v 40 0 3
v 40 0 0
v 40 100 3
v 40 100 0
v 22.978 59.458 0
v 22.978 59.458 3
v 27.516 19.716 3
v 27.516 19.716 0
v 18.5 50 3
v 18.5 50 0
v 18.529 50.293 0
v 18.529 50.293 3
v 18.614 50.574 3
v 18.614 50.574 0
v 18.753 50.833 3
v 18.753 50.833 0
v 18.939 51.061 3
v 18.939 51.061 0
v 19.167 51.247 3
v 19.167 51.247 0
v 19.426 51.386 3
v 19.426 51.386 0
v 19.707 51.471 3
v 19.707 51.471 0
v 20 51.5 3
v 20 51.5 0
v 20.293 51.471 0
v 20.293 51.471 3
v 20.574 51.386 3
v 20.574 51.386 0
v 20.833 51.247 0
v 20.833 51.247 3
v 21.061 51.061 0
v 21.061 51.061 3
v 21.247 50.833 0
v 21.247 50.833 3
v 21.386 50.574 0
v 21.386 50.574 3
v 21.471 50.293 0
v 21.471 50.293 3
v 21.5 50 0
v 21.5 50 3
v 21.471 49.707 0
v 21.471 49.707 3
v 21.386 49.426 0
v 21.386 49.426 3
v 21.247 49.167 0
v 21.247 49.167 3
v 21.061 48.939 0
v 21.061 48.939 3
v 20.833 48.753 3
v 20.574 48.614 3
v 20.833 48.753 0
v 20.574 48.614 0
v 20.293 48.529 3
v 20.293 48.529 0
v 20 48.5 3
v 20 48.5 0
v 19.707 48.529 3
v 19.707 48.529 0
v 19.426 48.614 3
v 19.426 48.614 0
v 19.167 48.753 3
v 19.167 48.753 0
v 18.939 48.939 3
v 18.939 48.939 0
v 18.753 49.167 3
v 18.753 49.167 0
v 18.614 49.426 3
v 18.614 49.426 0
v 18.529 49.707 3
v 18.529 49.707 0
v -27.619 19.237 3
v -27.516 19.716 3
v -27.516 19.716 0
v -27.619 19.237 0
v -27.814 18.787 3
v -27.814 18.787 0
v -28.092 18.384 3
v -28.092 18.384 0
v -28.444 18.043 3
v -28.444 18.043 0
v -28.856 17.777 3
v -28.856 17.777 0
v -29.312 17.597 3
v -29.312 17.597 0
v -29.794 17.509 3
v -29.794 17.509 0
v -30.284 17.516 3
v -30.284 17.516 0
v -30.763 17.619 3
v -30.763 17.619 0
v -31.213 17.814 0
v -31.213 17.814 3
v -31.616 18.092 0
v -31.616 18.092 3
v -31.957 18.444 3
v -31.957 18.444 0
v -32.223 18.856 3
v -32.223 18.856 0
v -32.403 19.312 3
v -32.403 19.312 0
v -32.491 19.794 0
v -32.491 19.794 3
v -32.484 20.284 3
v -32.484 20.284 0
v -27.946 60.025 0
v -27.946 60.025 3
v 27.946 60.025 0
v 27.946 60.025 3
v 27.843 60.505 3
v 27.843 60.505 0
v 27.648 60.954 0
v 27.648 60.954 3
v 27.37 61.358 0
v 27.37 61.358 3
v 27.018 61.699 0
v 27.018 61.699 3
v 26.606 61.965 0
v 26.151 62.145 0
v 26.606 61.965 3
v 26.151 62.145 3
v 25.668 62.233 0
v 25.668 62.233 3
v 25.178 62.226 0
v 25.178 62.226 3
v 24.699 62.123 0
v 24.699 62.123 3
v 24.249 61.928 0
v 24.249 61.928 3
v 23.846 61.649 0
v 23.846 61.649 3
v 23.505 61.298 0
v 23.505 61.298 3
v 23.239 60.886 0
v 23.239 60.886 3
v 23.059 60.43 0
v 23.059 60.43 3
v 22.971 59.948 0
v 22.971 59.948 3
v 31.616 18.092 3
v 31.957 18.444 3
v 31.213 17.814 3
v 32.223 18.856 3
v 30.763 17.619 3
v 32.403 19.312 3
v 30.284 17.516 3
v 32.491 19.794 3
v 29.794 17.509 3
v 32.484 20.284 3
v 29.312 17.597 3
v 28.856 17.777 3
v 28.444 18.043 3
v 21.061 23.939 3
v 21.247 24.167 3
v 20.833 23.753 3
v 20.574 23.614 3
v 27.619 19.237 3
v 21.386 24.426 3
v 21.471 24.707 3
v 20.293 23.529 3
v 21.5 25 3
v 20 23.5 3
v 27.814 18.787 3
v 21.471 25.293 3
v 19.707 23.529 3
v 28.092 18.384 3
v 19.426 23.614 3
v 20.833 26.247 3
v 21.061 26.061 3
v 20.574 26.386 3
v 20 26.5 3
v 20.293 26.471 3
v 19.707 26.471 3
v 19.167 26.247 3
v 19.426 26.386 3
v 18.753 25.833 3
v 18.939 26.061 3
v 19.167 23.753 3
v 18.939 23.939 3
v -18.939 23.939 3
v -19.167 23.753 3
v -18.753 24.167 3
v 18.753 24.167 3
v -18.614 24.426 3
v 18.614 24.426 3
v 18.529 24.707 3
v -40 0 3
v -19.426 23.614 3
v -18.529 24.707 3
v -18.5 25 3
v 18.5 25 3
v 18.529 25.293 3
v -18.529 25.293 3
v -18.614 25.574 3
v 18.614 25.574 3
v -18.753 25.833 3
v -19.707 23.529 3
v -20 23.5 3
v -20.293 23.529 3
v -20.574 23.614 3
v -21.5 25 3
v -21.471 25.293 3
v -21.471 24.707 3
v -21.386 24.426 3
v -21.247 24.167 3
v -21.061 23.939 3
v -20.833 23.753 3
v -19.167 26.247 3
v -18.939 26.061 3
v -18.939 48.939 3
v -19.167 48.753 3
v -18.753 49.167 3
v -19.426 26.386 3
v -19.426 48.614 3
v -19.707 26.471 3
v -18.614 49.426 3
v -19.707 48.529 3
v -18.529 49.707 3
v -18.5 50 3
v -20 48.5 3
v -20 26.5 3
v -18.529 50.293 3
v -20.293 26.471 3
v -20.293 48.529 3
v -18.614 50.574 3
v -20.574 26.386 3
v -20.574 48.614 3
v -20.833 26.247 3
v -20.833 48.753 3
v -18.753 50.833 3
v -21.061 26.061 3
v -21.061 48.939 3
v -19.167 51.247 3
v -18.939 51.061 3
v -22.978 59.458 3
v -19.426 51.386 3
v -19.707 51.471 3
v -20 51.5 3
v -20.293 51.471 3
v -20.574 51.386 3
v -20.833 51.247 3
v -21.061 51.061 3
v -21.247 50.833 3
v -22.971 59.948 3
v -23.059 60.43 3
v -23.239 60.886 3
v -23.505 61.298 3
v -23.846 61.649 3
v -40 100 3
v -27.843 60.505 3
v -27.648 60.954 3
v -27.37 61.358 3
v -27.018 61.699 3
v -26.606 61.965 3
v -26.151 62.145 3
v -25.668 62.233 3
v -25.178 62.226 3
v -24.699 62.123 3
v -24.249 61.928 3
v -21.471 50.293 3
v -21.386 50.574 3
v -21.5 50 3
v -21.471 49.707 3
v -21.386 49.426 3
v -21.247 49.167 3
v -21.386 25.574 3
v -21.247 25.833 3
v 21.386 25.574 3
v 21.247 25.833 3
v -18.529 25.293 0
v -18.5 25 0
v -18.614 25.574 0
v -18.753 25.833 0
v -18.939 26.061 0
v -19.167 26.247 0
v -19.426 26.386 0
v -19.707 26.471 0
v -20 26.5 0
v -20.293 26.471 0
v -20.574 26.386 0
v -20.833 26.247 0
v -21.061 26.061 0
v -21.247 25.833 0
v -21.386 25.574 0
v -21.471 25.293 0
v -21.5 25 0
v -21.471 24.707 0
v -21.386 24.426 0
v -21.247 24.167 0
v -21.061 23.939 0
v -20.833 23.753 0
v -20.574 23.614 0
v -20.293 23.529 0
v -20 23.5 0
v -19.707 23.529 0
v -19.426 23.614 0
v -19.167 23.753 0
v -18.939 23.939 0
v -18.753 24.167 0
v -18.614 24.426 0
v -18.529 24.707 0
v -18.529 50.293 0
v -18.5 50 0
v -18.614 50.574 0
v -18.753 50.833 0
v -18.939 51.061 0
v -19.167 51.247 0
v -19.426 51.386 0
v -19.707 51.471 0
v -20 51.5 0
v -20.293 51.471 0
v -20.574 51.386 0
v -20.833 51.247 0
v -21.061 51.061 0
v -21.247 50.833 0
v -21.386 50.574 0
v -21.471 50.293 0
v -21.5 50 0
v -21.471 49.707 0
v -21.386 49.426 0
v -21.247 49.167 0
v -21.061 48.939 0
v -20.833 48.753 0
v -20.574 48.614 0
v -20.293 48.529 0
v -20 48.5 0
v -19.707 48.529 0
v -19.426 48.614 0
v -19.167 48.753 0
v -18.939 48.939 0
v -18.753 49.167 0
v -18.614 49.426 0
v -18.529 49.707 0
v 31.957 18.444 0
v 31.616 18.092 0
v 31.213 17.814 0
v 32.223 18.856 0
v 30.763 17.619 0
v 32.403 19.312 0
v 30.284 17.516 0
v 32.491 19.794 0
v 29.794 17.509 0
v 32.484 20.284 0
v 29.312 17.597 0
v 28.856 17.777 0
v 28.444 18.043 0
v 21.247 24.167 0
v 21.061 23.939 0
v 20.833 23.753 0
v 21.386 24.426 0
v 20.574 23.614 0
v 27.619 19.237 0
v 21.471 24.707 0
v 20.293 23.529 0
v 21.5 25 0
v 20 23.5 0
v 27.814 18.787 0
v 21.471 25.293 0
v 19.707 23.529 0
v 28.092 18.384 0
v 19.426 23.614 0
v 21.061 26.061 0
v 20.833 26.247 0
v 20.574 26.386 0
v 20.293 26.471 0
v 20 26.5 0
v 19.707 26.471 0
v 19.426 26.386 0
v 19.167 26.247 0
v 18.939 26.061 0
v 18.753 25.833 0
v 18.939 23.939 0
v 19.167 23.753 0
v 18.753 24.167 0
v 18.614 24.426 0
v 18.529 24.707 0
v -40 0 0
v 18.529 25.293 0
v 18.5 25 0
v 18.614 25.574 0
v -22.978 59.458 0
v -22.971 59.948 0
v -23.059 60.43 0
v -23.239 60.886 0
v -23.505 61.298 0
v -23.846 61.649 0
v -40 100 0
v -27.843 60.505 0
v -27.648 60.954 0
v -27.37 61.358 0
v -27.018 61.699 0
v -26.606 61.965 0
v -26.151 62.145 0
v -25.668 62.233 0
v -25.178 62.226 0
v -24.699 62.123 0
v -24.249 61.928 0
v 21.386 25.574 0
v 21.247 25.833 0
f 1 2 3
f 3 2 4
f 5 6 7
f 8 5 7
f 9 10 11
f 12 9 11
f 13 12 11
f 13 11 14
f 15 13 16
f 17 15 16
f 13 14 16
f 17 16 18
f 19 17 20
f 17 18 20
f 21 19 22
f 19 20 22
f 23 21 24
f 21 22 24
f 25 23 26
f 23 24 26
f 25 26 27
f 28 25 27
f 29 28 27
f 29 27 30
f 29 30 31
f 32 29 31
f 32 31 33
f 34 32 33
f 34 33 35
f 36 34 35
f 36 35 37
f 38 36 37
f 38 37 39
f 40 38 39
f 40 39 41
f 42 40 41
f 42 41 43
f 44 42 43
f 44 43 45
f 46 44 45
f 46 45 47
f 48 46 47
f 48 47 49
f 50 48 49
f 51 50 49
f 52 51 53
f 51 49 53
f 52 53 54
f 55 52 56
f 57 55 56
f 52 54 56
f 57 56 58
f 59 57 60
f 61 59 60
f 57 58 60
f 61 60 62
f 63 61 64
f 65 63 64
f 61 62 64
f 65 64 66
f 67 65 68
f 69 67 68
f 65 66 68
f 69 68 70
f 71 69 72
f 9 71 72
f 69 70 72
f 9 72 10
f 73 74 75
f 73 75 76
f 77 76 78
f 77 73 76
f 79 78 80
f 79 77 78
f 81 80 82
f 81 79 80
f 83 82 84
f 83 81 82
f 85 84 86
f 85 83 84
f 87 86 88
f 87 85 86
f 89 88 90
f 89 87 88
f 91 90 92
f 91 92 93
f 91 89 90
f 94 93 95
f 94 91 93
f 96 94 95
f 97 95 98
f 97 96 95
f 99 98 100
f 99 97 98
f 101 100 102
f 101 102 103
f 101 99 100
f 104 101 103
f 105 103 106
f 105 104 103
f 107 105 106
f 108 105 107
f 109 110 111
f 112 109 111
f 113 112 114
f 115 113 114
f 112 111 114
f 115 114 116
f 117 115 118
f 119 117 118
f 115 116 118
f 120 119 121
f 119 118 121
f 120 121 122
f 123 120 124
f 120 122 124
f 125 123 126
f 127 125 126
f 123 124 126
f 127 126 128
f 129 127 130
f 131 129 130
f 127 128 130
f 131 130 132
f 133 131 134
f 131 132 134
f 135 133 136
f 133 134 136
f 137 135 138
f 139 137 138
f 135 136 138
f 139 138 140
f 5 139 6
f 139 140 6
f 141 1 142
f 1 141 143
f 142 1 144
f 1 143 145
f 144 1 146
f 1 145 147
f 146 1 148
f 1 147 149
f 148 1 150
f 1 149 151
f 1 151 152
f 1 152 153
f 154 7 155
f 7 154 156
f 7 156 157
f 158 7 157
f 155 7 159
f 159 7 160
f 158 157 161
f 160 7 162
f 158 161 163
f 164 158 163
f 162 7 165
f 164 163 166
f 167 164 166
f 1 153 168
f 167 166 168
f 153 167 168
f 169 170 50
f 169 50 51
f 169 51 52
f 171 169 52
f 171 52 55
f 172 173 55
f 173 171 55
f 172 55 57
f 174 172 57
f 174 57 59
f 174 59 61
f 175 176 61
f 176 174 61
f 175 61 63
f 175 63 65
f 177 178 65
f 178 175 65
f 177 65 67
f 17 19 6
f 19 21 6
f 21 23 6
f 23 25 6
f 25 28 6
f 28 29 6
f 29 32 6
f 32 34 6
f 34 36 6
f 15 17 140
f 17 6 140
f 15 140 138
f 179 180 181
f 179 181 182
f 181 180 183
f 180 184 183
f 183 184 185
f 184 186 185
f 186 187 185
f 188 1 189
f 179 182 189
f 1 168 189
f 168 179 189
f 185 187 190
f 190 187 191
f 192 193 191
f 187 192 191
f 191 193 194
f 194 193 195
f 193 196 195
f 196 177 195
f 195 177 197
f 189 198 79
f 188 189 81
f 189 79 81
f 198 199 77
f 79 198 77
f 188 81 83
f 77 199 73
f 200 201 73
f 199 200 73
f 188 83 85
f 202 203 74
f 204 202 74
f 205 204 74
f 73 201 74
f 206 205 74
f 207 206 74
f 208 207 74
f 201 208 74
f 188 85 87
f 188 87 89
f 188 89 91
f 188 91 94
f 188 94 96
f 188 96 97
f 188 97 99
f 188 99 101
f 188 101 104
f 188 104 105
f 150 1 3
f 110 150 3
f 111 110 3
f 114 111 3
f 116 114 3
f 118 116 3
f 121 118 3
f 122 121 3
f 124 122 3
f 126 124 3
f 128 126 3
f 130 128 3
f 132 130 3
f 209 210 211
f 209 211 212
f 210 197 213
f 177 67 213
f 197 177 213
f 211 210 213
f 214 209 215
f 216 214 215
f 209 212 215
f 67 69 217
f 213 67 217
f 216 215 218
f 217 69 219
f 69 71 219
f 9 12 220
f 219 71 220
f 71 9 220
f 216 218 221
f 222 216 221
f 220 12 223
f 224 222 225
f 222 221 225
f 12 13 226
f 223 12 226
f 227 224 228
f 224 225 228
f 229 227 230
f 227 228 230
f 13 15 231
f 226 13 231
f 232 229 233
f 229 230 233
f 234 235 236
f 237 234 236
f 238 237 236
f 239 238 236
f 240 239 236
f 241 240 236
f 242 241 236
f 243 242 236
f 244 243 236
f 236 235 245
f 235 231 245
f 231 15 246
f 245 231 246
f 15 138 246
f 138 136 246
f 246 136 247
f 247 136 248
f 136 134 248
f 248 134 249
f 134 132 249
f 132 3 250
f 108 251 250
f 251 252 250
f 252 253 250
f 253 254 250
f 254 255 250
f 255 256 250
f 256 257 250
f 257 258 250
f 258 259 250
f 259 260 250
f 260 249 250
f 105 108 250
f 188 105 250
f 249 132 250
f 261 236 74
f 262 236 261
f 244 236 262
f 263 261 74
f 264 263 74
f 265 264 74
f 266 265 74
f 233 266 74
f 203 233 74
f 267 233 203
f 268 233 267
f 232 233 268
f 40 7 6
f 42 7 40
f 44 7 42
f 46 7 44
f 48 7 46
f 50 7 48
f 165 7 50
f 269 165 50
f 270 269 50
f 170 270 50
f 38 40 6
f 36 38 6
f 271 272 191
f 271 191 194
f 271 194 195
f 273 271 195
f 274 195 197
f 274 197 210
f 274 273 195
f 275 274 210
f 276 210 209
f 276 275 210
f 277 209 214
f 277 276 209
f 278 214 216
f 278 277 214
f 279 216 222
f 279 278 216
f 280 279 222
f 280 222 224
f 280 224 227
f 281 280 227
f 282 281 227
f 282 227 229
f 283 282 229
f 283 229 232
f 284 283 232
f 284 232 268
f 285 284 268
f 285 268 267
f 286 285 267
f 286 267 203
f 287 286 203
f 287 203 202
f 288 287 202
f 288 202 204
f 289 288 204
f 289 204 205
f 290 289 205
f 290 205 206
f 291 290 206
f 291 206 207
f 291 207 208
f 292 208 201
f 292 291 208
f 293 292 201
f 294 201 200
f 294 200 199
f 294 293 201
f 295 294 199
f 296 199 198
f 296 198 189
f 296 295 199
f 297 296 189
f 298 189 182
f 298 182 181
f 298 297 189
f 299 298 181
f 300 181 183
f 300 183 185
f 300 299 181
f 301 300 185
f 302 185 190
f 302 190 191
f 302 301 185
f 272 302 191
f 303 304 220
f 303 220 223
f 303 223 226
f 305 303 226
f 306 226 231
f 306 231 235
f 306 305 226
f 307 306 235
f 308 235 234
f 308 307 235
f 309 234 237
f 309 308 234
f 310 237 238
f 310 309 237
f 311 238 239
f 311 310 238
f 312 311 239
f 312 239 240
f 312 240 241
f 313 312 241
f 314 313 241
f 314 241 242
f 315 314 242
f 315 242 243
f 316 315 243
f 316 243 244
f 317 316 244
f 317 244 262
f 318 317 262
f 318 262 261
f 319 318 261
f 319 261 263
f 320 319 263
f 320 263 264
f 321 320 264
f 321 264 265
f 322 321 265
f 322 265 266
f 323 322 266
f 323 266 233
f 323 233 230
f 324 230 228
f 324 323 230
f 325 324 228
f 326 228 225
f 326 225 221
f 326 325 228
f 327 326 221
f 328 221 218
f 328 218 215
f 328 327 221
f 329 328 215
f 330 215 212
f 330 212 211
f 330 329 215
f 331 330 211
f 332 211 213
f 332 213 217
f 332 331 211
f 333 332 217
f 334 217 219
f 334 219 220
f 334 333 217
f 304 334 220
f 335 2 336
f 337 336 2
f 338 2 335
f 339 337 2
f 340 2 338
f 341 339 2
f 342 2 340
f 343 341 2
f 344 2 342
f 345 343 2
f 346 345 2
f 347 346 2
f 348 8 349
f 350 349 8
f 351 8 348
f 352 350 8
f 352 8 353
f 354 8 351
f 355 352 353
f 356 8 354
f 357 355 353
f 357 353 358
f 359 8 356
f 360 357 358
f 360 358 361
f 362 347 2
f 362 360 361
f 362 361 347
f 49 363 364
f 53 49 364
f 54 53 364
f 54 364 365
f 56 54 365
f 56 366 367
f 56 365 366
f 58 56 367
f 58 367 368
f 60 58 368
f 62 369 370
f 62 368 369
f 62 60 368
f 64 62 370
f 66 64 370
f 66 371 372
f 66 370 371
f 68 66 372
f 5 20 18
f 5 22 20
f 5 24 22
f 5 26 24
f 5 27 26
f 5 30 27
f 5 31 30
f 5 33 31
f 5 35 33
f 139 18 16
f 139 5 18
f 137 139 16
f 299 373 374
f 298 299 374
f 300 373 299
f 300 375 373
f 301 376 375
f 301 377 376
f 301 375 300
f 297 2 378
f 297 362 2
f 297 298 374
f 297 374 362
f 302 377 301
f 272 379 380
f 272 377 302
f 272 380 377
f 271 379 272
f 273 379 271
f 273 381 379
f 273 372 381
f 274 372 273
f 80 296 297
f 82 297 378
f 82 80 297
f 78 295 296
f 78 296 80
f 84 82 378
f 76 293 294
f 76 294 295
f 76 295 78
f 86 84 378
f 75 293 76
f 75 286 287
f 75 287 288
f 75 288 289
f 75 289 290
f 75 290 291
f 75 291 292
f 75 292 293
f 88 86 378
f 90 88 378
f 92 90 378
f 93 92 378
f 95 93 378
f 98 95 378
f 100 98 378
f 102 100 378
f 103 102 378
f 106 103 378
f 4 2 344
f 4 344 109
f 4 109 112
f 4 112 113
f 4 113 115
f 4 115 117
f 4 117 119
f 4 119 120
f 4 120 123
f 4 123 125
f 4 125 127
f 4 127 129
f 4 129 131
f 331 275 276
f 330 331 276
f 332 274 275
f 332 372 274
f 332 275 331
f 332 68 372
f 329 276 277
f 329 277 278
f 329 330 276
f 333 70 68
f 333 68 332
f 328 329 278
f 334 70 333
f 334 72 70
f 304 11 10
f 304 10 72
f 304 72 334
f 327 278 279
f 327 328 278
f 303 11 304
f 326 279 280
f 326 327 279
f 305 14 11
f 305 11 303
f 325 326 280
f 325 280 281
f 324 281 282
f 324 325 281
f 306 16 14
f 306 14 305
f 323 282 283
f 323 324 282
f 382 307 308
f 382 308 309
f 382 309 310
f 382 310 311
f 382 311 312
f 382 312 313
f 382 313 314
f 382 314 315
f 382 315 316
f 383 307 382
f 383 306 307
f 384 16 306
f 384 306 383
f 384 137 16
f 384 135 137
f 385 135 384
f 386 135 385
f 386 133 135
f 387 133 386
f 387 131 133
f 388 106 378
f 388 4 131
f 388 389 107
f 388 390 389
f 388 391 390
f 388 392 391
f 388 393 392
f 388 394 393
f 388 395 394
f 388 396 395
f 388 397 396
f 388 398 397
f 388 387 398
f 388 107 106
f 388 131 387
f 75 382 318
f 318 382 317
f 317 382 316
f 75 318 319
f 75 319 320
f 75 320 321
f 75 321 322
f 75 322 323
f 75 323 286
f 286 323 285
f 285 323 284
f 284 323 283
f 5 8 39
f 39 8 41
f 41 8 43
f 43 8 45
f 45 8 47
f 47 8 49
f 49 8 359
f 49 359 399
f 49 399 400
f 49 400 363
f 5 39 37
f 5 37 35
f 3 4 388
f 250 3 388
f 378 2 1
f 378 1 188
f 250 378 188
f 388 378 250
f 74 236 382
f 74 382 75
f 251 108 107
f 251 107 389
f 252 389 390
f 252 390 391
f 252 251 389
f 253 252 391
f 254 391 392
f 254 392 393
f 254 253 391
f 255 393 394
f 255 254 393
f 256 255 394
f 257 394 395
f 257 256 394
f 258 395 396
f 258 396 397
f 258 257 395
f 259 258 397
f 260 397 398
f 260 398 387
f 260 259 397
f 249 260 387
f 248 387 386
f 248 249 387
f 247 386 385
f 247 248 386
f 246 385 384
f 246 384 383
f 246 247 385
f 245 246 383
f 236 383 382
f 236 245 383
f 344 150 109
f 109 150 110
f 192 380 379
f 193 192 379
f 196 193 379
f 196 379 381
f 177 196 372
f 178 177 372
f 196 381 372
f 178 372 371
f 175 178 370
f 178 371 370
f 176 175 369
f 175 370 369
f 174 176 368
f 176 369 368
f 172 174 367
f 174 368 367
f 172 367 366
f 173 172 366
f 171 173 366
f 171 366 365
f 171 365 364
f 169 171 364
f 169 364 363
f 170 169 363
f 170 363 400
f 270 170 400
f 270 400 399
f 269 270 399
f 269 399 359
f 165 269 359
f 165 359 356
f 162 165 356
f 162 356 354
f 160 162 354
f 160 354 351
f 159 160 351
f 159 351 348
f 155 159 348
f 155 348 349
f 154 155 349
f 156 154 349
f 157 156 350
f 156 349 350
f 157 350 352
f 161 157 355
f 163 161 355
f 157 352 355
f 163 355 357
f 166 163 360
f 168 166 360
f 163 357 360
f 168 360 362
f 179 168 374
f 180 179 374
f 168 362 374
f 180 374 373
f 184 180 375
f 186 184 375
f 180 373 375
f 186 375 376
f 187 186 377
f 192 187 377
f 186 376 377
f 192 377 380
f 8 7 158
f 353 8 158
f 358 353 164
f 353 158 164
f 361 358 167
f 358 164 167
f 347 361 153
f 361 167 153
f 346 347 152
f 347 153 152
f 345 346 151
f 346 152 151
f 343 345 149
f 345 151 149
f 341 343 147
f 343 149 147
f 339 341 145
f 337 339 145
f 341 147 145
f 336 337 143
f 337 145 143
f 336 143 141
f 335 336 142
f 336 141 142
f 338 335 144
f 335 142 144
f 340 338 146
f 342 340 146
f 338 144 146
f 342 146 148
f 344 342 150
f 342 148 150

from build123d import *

# Parameters (mm, degrees)
F0_W     = 40
F0_H     = 100
F1_DEPTH = 3
F4_D     = 3
F7_DEPTH = 41.597918


with BuildPart() as f1:
    # F0 (on Top) → F1 (new body)
    with BuildSketch(Plane.XY):
        with Locations((20, 50)):
            Rectangle(F0_W, F0_H)
    extrude(amount=F1_DEPTH)

    # F4 (through all)
    with Locations(Plane.XY.offset(3)):
        with Locations((20, 50), (20, 25)):
            Hole(F4_D / 2)

    # F6 (on face) → F7 (cut)
    with BuildSketch(Plane.XY.offset(3)):
        with BuildLine():
            ThreePointArc((27.516141, 19.716375), (30.283625, 17.516141), (32.483859, 20.283625))
            Line((32.483859, 20.283625), (27.945864, 60.025373))
            ThreePointArc((27.945864, 60.025373), (25.17838, 62.225608), (22.978145, 59.458124))
            Line((22.978145, 59.458124), (27.516141, 19.716375))
        make_face()
    extrude(amount=-F7_DEPTH, mode=Mode.SUBTRACT)

    # F8: F1 across plane


with BuildPart() as f1_1:
    add(f1.part)
    add(f1.part.mirror(Plane.YZ))


solid = f1_1.part
